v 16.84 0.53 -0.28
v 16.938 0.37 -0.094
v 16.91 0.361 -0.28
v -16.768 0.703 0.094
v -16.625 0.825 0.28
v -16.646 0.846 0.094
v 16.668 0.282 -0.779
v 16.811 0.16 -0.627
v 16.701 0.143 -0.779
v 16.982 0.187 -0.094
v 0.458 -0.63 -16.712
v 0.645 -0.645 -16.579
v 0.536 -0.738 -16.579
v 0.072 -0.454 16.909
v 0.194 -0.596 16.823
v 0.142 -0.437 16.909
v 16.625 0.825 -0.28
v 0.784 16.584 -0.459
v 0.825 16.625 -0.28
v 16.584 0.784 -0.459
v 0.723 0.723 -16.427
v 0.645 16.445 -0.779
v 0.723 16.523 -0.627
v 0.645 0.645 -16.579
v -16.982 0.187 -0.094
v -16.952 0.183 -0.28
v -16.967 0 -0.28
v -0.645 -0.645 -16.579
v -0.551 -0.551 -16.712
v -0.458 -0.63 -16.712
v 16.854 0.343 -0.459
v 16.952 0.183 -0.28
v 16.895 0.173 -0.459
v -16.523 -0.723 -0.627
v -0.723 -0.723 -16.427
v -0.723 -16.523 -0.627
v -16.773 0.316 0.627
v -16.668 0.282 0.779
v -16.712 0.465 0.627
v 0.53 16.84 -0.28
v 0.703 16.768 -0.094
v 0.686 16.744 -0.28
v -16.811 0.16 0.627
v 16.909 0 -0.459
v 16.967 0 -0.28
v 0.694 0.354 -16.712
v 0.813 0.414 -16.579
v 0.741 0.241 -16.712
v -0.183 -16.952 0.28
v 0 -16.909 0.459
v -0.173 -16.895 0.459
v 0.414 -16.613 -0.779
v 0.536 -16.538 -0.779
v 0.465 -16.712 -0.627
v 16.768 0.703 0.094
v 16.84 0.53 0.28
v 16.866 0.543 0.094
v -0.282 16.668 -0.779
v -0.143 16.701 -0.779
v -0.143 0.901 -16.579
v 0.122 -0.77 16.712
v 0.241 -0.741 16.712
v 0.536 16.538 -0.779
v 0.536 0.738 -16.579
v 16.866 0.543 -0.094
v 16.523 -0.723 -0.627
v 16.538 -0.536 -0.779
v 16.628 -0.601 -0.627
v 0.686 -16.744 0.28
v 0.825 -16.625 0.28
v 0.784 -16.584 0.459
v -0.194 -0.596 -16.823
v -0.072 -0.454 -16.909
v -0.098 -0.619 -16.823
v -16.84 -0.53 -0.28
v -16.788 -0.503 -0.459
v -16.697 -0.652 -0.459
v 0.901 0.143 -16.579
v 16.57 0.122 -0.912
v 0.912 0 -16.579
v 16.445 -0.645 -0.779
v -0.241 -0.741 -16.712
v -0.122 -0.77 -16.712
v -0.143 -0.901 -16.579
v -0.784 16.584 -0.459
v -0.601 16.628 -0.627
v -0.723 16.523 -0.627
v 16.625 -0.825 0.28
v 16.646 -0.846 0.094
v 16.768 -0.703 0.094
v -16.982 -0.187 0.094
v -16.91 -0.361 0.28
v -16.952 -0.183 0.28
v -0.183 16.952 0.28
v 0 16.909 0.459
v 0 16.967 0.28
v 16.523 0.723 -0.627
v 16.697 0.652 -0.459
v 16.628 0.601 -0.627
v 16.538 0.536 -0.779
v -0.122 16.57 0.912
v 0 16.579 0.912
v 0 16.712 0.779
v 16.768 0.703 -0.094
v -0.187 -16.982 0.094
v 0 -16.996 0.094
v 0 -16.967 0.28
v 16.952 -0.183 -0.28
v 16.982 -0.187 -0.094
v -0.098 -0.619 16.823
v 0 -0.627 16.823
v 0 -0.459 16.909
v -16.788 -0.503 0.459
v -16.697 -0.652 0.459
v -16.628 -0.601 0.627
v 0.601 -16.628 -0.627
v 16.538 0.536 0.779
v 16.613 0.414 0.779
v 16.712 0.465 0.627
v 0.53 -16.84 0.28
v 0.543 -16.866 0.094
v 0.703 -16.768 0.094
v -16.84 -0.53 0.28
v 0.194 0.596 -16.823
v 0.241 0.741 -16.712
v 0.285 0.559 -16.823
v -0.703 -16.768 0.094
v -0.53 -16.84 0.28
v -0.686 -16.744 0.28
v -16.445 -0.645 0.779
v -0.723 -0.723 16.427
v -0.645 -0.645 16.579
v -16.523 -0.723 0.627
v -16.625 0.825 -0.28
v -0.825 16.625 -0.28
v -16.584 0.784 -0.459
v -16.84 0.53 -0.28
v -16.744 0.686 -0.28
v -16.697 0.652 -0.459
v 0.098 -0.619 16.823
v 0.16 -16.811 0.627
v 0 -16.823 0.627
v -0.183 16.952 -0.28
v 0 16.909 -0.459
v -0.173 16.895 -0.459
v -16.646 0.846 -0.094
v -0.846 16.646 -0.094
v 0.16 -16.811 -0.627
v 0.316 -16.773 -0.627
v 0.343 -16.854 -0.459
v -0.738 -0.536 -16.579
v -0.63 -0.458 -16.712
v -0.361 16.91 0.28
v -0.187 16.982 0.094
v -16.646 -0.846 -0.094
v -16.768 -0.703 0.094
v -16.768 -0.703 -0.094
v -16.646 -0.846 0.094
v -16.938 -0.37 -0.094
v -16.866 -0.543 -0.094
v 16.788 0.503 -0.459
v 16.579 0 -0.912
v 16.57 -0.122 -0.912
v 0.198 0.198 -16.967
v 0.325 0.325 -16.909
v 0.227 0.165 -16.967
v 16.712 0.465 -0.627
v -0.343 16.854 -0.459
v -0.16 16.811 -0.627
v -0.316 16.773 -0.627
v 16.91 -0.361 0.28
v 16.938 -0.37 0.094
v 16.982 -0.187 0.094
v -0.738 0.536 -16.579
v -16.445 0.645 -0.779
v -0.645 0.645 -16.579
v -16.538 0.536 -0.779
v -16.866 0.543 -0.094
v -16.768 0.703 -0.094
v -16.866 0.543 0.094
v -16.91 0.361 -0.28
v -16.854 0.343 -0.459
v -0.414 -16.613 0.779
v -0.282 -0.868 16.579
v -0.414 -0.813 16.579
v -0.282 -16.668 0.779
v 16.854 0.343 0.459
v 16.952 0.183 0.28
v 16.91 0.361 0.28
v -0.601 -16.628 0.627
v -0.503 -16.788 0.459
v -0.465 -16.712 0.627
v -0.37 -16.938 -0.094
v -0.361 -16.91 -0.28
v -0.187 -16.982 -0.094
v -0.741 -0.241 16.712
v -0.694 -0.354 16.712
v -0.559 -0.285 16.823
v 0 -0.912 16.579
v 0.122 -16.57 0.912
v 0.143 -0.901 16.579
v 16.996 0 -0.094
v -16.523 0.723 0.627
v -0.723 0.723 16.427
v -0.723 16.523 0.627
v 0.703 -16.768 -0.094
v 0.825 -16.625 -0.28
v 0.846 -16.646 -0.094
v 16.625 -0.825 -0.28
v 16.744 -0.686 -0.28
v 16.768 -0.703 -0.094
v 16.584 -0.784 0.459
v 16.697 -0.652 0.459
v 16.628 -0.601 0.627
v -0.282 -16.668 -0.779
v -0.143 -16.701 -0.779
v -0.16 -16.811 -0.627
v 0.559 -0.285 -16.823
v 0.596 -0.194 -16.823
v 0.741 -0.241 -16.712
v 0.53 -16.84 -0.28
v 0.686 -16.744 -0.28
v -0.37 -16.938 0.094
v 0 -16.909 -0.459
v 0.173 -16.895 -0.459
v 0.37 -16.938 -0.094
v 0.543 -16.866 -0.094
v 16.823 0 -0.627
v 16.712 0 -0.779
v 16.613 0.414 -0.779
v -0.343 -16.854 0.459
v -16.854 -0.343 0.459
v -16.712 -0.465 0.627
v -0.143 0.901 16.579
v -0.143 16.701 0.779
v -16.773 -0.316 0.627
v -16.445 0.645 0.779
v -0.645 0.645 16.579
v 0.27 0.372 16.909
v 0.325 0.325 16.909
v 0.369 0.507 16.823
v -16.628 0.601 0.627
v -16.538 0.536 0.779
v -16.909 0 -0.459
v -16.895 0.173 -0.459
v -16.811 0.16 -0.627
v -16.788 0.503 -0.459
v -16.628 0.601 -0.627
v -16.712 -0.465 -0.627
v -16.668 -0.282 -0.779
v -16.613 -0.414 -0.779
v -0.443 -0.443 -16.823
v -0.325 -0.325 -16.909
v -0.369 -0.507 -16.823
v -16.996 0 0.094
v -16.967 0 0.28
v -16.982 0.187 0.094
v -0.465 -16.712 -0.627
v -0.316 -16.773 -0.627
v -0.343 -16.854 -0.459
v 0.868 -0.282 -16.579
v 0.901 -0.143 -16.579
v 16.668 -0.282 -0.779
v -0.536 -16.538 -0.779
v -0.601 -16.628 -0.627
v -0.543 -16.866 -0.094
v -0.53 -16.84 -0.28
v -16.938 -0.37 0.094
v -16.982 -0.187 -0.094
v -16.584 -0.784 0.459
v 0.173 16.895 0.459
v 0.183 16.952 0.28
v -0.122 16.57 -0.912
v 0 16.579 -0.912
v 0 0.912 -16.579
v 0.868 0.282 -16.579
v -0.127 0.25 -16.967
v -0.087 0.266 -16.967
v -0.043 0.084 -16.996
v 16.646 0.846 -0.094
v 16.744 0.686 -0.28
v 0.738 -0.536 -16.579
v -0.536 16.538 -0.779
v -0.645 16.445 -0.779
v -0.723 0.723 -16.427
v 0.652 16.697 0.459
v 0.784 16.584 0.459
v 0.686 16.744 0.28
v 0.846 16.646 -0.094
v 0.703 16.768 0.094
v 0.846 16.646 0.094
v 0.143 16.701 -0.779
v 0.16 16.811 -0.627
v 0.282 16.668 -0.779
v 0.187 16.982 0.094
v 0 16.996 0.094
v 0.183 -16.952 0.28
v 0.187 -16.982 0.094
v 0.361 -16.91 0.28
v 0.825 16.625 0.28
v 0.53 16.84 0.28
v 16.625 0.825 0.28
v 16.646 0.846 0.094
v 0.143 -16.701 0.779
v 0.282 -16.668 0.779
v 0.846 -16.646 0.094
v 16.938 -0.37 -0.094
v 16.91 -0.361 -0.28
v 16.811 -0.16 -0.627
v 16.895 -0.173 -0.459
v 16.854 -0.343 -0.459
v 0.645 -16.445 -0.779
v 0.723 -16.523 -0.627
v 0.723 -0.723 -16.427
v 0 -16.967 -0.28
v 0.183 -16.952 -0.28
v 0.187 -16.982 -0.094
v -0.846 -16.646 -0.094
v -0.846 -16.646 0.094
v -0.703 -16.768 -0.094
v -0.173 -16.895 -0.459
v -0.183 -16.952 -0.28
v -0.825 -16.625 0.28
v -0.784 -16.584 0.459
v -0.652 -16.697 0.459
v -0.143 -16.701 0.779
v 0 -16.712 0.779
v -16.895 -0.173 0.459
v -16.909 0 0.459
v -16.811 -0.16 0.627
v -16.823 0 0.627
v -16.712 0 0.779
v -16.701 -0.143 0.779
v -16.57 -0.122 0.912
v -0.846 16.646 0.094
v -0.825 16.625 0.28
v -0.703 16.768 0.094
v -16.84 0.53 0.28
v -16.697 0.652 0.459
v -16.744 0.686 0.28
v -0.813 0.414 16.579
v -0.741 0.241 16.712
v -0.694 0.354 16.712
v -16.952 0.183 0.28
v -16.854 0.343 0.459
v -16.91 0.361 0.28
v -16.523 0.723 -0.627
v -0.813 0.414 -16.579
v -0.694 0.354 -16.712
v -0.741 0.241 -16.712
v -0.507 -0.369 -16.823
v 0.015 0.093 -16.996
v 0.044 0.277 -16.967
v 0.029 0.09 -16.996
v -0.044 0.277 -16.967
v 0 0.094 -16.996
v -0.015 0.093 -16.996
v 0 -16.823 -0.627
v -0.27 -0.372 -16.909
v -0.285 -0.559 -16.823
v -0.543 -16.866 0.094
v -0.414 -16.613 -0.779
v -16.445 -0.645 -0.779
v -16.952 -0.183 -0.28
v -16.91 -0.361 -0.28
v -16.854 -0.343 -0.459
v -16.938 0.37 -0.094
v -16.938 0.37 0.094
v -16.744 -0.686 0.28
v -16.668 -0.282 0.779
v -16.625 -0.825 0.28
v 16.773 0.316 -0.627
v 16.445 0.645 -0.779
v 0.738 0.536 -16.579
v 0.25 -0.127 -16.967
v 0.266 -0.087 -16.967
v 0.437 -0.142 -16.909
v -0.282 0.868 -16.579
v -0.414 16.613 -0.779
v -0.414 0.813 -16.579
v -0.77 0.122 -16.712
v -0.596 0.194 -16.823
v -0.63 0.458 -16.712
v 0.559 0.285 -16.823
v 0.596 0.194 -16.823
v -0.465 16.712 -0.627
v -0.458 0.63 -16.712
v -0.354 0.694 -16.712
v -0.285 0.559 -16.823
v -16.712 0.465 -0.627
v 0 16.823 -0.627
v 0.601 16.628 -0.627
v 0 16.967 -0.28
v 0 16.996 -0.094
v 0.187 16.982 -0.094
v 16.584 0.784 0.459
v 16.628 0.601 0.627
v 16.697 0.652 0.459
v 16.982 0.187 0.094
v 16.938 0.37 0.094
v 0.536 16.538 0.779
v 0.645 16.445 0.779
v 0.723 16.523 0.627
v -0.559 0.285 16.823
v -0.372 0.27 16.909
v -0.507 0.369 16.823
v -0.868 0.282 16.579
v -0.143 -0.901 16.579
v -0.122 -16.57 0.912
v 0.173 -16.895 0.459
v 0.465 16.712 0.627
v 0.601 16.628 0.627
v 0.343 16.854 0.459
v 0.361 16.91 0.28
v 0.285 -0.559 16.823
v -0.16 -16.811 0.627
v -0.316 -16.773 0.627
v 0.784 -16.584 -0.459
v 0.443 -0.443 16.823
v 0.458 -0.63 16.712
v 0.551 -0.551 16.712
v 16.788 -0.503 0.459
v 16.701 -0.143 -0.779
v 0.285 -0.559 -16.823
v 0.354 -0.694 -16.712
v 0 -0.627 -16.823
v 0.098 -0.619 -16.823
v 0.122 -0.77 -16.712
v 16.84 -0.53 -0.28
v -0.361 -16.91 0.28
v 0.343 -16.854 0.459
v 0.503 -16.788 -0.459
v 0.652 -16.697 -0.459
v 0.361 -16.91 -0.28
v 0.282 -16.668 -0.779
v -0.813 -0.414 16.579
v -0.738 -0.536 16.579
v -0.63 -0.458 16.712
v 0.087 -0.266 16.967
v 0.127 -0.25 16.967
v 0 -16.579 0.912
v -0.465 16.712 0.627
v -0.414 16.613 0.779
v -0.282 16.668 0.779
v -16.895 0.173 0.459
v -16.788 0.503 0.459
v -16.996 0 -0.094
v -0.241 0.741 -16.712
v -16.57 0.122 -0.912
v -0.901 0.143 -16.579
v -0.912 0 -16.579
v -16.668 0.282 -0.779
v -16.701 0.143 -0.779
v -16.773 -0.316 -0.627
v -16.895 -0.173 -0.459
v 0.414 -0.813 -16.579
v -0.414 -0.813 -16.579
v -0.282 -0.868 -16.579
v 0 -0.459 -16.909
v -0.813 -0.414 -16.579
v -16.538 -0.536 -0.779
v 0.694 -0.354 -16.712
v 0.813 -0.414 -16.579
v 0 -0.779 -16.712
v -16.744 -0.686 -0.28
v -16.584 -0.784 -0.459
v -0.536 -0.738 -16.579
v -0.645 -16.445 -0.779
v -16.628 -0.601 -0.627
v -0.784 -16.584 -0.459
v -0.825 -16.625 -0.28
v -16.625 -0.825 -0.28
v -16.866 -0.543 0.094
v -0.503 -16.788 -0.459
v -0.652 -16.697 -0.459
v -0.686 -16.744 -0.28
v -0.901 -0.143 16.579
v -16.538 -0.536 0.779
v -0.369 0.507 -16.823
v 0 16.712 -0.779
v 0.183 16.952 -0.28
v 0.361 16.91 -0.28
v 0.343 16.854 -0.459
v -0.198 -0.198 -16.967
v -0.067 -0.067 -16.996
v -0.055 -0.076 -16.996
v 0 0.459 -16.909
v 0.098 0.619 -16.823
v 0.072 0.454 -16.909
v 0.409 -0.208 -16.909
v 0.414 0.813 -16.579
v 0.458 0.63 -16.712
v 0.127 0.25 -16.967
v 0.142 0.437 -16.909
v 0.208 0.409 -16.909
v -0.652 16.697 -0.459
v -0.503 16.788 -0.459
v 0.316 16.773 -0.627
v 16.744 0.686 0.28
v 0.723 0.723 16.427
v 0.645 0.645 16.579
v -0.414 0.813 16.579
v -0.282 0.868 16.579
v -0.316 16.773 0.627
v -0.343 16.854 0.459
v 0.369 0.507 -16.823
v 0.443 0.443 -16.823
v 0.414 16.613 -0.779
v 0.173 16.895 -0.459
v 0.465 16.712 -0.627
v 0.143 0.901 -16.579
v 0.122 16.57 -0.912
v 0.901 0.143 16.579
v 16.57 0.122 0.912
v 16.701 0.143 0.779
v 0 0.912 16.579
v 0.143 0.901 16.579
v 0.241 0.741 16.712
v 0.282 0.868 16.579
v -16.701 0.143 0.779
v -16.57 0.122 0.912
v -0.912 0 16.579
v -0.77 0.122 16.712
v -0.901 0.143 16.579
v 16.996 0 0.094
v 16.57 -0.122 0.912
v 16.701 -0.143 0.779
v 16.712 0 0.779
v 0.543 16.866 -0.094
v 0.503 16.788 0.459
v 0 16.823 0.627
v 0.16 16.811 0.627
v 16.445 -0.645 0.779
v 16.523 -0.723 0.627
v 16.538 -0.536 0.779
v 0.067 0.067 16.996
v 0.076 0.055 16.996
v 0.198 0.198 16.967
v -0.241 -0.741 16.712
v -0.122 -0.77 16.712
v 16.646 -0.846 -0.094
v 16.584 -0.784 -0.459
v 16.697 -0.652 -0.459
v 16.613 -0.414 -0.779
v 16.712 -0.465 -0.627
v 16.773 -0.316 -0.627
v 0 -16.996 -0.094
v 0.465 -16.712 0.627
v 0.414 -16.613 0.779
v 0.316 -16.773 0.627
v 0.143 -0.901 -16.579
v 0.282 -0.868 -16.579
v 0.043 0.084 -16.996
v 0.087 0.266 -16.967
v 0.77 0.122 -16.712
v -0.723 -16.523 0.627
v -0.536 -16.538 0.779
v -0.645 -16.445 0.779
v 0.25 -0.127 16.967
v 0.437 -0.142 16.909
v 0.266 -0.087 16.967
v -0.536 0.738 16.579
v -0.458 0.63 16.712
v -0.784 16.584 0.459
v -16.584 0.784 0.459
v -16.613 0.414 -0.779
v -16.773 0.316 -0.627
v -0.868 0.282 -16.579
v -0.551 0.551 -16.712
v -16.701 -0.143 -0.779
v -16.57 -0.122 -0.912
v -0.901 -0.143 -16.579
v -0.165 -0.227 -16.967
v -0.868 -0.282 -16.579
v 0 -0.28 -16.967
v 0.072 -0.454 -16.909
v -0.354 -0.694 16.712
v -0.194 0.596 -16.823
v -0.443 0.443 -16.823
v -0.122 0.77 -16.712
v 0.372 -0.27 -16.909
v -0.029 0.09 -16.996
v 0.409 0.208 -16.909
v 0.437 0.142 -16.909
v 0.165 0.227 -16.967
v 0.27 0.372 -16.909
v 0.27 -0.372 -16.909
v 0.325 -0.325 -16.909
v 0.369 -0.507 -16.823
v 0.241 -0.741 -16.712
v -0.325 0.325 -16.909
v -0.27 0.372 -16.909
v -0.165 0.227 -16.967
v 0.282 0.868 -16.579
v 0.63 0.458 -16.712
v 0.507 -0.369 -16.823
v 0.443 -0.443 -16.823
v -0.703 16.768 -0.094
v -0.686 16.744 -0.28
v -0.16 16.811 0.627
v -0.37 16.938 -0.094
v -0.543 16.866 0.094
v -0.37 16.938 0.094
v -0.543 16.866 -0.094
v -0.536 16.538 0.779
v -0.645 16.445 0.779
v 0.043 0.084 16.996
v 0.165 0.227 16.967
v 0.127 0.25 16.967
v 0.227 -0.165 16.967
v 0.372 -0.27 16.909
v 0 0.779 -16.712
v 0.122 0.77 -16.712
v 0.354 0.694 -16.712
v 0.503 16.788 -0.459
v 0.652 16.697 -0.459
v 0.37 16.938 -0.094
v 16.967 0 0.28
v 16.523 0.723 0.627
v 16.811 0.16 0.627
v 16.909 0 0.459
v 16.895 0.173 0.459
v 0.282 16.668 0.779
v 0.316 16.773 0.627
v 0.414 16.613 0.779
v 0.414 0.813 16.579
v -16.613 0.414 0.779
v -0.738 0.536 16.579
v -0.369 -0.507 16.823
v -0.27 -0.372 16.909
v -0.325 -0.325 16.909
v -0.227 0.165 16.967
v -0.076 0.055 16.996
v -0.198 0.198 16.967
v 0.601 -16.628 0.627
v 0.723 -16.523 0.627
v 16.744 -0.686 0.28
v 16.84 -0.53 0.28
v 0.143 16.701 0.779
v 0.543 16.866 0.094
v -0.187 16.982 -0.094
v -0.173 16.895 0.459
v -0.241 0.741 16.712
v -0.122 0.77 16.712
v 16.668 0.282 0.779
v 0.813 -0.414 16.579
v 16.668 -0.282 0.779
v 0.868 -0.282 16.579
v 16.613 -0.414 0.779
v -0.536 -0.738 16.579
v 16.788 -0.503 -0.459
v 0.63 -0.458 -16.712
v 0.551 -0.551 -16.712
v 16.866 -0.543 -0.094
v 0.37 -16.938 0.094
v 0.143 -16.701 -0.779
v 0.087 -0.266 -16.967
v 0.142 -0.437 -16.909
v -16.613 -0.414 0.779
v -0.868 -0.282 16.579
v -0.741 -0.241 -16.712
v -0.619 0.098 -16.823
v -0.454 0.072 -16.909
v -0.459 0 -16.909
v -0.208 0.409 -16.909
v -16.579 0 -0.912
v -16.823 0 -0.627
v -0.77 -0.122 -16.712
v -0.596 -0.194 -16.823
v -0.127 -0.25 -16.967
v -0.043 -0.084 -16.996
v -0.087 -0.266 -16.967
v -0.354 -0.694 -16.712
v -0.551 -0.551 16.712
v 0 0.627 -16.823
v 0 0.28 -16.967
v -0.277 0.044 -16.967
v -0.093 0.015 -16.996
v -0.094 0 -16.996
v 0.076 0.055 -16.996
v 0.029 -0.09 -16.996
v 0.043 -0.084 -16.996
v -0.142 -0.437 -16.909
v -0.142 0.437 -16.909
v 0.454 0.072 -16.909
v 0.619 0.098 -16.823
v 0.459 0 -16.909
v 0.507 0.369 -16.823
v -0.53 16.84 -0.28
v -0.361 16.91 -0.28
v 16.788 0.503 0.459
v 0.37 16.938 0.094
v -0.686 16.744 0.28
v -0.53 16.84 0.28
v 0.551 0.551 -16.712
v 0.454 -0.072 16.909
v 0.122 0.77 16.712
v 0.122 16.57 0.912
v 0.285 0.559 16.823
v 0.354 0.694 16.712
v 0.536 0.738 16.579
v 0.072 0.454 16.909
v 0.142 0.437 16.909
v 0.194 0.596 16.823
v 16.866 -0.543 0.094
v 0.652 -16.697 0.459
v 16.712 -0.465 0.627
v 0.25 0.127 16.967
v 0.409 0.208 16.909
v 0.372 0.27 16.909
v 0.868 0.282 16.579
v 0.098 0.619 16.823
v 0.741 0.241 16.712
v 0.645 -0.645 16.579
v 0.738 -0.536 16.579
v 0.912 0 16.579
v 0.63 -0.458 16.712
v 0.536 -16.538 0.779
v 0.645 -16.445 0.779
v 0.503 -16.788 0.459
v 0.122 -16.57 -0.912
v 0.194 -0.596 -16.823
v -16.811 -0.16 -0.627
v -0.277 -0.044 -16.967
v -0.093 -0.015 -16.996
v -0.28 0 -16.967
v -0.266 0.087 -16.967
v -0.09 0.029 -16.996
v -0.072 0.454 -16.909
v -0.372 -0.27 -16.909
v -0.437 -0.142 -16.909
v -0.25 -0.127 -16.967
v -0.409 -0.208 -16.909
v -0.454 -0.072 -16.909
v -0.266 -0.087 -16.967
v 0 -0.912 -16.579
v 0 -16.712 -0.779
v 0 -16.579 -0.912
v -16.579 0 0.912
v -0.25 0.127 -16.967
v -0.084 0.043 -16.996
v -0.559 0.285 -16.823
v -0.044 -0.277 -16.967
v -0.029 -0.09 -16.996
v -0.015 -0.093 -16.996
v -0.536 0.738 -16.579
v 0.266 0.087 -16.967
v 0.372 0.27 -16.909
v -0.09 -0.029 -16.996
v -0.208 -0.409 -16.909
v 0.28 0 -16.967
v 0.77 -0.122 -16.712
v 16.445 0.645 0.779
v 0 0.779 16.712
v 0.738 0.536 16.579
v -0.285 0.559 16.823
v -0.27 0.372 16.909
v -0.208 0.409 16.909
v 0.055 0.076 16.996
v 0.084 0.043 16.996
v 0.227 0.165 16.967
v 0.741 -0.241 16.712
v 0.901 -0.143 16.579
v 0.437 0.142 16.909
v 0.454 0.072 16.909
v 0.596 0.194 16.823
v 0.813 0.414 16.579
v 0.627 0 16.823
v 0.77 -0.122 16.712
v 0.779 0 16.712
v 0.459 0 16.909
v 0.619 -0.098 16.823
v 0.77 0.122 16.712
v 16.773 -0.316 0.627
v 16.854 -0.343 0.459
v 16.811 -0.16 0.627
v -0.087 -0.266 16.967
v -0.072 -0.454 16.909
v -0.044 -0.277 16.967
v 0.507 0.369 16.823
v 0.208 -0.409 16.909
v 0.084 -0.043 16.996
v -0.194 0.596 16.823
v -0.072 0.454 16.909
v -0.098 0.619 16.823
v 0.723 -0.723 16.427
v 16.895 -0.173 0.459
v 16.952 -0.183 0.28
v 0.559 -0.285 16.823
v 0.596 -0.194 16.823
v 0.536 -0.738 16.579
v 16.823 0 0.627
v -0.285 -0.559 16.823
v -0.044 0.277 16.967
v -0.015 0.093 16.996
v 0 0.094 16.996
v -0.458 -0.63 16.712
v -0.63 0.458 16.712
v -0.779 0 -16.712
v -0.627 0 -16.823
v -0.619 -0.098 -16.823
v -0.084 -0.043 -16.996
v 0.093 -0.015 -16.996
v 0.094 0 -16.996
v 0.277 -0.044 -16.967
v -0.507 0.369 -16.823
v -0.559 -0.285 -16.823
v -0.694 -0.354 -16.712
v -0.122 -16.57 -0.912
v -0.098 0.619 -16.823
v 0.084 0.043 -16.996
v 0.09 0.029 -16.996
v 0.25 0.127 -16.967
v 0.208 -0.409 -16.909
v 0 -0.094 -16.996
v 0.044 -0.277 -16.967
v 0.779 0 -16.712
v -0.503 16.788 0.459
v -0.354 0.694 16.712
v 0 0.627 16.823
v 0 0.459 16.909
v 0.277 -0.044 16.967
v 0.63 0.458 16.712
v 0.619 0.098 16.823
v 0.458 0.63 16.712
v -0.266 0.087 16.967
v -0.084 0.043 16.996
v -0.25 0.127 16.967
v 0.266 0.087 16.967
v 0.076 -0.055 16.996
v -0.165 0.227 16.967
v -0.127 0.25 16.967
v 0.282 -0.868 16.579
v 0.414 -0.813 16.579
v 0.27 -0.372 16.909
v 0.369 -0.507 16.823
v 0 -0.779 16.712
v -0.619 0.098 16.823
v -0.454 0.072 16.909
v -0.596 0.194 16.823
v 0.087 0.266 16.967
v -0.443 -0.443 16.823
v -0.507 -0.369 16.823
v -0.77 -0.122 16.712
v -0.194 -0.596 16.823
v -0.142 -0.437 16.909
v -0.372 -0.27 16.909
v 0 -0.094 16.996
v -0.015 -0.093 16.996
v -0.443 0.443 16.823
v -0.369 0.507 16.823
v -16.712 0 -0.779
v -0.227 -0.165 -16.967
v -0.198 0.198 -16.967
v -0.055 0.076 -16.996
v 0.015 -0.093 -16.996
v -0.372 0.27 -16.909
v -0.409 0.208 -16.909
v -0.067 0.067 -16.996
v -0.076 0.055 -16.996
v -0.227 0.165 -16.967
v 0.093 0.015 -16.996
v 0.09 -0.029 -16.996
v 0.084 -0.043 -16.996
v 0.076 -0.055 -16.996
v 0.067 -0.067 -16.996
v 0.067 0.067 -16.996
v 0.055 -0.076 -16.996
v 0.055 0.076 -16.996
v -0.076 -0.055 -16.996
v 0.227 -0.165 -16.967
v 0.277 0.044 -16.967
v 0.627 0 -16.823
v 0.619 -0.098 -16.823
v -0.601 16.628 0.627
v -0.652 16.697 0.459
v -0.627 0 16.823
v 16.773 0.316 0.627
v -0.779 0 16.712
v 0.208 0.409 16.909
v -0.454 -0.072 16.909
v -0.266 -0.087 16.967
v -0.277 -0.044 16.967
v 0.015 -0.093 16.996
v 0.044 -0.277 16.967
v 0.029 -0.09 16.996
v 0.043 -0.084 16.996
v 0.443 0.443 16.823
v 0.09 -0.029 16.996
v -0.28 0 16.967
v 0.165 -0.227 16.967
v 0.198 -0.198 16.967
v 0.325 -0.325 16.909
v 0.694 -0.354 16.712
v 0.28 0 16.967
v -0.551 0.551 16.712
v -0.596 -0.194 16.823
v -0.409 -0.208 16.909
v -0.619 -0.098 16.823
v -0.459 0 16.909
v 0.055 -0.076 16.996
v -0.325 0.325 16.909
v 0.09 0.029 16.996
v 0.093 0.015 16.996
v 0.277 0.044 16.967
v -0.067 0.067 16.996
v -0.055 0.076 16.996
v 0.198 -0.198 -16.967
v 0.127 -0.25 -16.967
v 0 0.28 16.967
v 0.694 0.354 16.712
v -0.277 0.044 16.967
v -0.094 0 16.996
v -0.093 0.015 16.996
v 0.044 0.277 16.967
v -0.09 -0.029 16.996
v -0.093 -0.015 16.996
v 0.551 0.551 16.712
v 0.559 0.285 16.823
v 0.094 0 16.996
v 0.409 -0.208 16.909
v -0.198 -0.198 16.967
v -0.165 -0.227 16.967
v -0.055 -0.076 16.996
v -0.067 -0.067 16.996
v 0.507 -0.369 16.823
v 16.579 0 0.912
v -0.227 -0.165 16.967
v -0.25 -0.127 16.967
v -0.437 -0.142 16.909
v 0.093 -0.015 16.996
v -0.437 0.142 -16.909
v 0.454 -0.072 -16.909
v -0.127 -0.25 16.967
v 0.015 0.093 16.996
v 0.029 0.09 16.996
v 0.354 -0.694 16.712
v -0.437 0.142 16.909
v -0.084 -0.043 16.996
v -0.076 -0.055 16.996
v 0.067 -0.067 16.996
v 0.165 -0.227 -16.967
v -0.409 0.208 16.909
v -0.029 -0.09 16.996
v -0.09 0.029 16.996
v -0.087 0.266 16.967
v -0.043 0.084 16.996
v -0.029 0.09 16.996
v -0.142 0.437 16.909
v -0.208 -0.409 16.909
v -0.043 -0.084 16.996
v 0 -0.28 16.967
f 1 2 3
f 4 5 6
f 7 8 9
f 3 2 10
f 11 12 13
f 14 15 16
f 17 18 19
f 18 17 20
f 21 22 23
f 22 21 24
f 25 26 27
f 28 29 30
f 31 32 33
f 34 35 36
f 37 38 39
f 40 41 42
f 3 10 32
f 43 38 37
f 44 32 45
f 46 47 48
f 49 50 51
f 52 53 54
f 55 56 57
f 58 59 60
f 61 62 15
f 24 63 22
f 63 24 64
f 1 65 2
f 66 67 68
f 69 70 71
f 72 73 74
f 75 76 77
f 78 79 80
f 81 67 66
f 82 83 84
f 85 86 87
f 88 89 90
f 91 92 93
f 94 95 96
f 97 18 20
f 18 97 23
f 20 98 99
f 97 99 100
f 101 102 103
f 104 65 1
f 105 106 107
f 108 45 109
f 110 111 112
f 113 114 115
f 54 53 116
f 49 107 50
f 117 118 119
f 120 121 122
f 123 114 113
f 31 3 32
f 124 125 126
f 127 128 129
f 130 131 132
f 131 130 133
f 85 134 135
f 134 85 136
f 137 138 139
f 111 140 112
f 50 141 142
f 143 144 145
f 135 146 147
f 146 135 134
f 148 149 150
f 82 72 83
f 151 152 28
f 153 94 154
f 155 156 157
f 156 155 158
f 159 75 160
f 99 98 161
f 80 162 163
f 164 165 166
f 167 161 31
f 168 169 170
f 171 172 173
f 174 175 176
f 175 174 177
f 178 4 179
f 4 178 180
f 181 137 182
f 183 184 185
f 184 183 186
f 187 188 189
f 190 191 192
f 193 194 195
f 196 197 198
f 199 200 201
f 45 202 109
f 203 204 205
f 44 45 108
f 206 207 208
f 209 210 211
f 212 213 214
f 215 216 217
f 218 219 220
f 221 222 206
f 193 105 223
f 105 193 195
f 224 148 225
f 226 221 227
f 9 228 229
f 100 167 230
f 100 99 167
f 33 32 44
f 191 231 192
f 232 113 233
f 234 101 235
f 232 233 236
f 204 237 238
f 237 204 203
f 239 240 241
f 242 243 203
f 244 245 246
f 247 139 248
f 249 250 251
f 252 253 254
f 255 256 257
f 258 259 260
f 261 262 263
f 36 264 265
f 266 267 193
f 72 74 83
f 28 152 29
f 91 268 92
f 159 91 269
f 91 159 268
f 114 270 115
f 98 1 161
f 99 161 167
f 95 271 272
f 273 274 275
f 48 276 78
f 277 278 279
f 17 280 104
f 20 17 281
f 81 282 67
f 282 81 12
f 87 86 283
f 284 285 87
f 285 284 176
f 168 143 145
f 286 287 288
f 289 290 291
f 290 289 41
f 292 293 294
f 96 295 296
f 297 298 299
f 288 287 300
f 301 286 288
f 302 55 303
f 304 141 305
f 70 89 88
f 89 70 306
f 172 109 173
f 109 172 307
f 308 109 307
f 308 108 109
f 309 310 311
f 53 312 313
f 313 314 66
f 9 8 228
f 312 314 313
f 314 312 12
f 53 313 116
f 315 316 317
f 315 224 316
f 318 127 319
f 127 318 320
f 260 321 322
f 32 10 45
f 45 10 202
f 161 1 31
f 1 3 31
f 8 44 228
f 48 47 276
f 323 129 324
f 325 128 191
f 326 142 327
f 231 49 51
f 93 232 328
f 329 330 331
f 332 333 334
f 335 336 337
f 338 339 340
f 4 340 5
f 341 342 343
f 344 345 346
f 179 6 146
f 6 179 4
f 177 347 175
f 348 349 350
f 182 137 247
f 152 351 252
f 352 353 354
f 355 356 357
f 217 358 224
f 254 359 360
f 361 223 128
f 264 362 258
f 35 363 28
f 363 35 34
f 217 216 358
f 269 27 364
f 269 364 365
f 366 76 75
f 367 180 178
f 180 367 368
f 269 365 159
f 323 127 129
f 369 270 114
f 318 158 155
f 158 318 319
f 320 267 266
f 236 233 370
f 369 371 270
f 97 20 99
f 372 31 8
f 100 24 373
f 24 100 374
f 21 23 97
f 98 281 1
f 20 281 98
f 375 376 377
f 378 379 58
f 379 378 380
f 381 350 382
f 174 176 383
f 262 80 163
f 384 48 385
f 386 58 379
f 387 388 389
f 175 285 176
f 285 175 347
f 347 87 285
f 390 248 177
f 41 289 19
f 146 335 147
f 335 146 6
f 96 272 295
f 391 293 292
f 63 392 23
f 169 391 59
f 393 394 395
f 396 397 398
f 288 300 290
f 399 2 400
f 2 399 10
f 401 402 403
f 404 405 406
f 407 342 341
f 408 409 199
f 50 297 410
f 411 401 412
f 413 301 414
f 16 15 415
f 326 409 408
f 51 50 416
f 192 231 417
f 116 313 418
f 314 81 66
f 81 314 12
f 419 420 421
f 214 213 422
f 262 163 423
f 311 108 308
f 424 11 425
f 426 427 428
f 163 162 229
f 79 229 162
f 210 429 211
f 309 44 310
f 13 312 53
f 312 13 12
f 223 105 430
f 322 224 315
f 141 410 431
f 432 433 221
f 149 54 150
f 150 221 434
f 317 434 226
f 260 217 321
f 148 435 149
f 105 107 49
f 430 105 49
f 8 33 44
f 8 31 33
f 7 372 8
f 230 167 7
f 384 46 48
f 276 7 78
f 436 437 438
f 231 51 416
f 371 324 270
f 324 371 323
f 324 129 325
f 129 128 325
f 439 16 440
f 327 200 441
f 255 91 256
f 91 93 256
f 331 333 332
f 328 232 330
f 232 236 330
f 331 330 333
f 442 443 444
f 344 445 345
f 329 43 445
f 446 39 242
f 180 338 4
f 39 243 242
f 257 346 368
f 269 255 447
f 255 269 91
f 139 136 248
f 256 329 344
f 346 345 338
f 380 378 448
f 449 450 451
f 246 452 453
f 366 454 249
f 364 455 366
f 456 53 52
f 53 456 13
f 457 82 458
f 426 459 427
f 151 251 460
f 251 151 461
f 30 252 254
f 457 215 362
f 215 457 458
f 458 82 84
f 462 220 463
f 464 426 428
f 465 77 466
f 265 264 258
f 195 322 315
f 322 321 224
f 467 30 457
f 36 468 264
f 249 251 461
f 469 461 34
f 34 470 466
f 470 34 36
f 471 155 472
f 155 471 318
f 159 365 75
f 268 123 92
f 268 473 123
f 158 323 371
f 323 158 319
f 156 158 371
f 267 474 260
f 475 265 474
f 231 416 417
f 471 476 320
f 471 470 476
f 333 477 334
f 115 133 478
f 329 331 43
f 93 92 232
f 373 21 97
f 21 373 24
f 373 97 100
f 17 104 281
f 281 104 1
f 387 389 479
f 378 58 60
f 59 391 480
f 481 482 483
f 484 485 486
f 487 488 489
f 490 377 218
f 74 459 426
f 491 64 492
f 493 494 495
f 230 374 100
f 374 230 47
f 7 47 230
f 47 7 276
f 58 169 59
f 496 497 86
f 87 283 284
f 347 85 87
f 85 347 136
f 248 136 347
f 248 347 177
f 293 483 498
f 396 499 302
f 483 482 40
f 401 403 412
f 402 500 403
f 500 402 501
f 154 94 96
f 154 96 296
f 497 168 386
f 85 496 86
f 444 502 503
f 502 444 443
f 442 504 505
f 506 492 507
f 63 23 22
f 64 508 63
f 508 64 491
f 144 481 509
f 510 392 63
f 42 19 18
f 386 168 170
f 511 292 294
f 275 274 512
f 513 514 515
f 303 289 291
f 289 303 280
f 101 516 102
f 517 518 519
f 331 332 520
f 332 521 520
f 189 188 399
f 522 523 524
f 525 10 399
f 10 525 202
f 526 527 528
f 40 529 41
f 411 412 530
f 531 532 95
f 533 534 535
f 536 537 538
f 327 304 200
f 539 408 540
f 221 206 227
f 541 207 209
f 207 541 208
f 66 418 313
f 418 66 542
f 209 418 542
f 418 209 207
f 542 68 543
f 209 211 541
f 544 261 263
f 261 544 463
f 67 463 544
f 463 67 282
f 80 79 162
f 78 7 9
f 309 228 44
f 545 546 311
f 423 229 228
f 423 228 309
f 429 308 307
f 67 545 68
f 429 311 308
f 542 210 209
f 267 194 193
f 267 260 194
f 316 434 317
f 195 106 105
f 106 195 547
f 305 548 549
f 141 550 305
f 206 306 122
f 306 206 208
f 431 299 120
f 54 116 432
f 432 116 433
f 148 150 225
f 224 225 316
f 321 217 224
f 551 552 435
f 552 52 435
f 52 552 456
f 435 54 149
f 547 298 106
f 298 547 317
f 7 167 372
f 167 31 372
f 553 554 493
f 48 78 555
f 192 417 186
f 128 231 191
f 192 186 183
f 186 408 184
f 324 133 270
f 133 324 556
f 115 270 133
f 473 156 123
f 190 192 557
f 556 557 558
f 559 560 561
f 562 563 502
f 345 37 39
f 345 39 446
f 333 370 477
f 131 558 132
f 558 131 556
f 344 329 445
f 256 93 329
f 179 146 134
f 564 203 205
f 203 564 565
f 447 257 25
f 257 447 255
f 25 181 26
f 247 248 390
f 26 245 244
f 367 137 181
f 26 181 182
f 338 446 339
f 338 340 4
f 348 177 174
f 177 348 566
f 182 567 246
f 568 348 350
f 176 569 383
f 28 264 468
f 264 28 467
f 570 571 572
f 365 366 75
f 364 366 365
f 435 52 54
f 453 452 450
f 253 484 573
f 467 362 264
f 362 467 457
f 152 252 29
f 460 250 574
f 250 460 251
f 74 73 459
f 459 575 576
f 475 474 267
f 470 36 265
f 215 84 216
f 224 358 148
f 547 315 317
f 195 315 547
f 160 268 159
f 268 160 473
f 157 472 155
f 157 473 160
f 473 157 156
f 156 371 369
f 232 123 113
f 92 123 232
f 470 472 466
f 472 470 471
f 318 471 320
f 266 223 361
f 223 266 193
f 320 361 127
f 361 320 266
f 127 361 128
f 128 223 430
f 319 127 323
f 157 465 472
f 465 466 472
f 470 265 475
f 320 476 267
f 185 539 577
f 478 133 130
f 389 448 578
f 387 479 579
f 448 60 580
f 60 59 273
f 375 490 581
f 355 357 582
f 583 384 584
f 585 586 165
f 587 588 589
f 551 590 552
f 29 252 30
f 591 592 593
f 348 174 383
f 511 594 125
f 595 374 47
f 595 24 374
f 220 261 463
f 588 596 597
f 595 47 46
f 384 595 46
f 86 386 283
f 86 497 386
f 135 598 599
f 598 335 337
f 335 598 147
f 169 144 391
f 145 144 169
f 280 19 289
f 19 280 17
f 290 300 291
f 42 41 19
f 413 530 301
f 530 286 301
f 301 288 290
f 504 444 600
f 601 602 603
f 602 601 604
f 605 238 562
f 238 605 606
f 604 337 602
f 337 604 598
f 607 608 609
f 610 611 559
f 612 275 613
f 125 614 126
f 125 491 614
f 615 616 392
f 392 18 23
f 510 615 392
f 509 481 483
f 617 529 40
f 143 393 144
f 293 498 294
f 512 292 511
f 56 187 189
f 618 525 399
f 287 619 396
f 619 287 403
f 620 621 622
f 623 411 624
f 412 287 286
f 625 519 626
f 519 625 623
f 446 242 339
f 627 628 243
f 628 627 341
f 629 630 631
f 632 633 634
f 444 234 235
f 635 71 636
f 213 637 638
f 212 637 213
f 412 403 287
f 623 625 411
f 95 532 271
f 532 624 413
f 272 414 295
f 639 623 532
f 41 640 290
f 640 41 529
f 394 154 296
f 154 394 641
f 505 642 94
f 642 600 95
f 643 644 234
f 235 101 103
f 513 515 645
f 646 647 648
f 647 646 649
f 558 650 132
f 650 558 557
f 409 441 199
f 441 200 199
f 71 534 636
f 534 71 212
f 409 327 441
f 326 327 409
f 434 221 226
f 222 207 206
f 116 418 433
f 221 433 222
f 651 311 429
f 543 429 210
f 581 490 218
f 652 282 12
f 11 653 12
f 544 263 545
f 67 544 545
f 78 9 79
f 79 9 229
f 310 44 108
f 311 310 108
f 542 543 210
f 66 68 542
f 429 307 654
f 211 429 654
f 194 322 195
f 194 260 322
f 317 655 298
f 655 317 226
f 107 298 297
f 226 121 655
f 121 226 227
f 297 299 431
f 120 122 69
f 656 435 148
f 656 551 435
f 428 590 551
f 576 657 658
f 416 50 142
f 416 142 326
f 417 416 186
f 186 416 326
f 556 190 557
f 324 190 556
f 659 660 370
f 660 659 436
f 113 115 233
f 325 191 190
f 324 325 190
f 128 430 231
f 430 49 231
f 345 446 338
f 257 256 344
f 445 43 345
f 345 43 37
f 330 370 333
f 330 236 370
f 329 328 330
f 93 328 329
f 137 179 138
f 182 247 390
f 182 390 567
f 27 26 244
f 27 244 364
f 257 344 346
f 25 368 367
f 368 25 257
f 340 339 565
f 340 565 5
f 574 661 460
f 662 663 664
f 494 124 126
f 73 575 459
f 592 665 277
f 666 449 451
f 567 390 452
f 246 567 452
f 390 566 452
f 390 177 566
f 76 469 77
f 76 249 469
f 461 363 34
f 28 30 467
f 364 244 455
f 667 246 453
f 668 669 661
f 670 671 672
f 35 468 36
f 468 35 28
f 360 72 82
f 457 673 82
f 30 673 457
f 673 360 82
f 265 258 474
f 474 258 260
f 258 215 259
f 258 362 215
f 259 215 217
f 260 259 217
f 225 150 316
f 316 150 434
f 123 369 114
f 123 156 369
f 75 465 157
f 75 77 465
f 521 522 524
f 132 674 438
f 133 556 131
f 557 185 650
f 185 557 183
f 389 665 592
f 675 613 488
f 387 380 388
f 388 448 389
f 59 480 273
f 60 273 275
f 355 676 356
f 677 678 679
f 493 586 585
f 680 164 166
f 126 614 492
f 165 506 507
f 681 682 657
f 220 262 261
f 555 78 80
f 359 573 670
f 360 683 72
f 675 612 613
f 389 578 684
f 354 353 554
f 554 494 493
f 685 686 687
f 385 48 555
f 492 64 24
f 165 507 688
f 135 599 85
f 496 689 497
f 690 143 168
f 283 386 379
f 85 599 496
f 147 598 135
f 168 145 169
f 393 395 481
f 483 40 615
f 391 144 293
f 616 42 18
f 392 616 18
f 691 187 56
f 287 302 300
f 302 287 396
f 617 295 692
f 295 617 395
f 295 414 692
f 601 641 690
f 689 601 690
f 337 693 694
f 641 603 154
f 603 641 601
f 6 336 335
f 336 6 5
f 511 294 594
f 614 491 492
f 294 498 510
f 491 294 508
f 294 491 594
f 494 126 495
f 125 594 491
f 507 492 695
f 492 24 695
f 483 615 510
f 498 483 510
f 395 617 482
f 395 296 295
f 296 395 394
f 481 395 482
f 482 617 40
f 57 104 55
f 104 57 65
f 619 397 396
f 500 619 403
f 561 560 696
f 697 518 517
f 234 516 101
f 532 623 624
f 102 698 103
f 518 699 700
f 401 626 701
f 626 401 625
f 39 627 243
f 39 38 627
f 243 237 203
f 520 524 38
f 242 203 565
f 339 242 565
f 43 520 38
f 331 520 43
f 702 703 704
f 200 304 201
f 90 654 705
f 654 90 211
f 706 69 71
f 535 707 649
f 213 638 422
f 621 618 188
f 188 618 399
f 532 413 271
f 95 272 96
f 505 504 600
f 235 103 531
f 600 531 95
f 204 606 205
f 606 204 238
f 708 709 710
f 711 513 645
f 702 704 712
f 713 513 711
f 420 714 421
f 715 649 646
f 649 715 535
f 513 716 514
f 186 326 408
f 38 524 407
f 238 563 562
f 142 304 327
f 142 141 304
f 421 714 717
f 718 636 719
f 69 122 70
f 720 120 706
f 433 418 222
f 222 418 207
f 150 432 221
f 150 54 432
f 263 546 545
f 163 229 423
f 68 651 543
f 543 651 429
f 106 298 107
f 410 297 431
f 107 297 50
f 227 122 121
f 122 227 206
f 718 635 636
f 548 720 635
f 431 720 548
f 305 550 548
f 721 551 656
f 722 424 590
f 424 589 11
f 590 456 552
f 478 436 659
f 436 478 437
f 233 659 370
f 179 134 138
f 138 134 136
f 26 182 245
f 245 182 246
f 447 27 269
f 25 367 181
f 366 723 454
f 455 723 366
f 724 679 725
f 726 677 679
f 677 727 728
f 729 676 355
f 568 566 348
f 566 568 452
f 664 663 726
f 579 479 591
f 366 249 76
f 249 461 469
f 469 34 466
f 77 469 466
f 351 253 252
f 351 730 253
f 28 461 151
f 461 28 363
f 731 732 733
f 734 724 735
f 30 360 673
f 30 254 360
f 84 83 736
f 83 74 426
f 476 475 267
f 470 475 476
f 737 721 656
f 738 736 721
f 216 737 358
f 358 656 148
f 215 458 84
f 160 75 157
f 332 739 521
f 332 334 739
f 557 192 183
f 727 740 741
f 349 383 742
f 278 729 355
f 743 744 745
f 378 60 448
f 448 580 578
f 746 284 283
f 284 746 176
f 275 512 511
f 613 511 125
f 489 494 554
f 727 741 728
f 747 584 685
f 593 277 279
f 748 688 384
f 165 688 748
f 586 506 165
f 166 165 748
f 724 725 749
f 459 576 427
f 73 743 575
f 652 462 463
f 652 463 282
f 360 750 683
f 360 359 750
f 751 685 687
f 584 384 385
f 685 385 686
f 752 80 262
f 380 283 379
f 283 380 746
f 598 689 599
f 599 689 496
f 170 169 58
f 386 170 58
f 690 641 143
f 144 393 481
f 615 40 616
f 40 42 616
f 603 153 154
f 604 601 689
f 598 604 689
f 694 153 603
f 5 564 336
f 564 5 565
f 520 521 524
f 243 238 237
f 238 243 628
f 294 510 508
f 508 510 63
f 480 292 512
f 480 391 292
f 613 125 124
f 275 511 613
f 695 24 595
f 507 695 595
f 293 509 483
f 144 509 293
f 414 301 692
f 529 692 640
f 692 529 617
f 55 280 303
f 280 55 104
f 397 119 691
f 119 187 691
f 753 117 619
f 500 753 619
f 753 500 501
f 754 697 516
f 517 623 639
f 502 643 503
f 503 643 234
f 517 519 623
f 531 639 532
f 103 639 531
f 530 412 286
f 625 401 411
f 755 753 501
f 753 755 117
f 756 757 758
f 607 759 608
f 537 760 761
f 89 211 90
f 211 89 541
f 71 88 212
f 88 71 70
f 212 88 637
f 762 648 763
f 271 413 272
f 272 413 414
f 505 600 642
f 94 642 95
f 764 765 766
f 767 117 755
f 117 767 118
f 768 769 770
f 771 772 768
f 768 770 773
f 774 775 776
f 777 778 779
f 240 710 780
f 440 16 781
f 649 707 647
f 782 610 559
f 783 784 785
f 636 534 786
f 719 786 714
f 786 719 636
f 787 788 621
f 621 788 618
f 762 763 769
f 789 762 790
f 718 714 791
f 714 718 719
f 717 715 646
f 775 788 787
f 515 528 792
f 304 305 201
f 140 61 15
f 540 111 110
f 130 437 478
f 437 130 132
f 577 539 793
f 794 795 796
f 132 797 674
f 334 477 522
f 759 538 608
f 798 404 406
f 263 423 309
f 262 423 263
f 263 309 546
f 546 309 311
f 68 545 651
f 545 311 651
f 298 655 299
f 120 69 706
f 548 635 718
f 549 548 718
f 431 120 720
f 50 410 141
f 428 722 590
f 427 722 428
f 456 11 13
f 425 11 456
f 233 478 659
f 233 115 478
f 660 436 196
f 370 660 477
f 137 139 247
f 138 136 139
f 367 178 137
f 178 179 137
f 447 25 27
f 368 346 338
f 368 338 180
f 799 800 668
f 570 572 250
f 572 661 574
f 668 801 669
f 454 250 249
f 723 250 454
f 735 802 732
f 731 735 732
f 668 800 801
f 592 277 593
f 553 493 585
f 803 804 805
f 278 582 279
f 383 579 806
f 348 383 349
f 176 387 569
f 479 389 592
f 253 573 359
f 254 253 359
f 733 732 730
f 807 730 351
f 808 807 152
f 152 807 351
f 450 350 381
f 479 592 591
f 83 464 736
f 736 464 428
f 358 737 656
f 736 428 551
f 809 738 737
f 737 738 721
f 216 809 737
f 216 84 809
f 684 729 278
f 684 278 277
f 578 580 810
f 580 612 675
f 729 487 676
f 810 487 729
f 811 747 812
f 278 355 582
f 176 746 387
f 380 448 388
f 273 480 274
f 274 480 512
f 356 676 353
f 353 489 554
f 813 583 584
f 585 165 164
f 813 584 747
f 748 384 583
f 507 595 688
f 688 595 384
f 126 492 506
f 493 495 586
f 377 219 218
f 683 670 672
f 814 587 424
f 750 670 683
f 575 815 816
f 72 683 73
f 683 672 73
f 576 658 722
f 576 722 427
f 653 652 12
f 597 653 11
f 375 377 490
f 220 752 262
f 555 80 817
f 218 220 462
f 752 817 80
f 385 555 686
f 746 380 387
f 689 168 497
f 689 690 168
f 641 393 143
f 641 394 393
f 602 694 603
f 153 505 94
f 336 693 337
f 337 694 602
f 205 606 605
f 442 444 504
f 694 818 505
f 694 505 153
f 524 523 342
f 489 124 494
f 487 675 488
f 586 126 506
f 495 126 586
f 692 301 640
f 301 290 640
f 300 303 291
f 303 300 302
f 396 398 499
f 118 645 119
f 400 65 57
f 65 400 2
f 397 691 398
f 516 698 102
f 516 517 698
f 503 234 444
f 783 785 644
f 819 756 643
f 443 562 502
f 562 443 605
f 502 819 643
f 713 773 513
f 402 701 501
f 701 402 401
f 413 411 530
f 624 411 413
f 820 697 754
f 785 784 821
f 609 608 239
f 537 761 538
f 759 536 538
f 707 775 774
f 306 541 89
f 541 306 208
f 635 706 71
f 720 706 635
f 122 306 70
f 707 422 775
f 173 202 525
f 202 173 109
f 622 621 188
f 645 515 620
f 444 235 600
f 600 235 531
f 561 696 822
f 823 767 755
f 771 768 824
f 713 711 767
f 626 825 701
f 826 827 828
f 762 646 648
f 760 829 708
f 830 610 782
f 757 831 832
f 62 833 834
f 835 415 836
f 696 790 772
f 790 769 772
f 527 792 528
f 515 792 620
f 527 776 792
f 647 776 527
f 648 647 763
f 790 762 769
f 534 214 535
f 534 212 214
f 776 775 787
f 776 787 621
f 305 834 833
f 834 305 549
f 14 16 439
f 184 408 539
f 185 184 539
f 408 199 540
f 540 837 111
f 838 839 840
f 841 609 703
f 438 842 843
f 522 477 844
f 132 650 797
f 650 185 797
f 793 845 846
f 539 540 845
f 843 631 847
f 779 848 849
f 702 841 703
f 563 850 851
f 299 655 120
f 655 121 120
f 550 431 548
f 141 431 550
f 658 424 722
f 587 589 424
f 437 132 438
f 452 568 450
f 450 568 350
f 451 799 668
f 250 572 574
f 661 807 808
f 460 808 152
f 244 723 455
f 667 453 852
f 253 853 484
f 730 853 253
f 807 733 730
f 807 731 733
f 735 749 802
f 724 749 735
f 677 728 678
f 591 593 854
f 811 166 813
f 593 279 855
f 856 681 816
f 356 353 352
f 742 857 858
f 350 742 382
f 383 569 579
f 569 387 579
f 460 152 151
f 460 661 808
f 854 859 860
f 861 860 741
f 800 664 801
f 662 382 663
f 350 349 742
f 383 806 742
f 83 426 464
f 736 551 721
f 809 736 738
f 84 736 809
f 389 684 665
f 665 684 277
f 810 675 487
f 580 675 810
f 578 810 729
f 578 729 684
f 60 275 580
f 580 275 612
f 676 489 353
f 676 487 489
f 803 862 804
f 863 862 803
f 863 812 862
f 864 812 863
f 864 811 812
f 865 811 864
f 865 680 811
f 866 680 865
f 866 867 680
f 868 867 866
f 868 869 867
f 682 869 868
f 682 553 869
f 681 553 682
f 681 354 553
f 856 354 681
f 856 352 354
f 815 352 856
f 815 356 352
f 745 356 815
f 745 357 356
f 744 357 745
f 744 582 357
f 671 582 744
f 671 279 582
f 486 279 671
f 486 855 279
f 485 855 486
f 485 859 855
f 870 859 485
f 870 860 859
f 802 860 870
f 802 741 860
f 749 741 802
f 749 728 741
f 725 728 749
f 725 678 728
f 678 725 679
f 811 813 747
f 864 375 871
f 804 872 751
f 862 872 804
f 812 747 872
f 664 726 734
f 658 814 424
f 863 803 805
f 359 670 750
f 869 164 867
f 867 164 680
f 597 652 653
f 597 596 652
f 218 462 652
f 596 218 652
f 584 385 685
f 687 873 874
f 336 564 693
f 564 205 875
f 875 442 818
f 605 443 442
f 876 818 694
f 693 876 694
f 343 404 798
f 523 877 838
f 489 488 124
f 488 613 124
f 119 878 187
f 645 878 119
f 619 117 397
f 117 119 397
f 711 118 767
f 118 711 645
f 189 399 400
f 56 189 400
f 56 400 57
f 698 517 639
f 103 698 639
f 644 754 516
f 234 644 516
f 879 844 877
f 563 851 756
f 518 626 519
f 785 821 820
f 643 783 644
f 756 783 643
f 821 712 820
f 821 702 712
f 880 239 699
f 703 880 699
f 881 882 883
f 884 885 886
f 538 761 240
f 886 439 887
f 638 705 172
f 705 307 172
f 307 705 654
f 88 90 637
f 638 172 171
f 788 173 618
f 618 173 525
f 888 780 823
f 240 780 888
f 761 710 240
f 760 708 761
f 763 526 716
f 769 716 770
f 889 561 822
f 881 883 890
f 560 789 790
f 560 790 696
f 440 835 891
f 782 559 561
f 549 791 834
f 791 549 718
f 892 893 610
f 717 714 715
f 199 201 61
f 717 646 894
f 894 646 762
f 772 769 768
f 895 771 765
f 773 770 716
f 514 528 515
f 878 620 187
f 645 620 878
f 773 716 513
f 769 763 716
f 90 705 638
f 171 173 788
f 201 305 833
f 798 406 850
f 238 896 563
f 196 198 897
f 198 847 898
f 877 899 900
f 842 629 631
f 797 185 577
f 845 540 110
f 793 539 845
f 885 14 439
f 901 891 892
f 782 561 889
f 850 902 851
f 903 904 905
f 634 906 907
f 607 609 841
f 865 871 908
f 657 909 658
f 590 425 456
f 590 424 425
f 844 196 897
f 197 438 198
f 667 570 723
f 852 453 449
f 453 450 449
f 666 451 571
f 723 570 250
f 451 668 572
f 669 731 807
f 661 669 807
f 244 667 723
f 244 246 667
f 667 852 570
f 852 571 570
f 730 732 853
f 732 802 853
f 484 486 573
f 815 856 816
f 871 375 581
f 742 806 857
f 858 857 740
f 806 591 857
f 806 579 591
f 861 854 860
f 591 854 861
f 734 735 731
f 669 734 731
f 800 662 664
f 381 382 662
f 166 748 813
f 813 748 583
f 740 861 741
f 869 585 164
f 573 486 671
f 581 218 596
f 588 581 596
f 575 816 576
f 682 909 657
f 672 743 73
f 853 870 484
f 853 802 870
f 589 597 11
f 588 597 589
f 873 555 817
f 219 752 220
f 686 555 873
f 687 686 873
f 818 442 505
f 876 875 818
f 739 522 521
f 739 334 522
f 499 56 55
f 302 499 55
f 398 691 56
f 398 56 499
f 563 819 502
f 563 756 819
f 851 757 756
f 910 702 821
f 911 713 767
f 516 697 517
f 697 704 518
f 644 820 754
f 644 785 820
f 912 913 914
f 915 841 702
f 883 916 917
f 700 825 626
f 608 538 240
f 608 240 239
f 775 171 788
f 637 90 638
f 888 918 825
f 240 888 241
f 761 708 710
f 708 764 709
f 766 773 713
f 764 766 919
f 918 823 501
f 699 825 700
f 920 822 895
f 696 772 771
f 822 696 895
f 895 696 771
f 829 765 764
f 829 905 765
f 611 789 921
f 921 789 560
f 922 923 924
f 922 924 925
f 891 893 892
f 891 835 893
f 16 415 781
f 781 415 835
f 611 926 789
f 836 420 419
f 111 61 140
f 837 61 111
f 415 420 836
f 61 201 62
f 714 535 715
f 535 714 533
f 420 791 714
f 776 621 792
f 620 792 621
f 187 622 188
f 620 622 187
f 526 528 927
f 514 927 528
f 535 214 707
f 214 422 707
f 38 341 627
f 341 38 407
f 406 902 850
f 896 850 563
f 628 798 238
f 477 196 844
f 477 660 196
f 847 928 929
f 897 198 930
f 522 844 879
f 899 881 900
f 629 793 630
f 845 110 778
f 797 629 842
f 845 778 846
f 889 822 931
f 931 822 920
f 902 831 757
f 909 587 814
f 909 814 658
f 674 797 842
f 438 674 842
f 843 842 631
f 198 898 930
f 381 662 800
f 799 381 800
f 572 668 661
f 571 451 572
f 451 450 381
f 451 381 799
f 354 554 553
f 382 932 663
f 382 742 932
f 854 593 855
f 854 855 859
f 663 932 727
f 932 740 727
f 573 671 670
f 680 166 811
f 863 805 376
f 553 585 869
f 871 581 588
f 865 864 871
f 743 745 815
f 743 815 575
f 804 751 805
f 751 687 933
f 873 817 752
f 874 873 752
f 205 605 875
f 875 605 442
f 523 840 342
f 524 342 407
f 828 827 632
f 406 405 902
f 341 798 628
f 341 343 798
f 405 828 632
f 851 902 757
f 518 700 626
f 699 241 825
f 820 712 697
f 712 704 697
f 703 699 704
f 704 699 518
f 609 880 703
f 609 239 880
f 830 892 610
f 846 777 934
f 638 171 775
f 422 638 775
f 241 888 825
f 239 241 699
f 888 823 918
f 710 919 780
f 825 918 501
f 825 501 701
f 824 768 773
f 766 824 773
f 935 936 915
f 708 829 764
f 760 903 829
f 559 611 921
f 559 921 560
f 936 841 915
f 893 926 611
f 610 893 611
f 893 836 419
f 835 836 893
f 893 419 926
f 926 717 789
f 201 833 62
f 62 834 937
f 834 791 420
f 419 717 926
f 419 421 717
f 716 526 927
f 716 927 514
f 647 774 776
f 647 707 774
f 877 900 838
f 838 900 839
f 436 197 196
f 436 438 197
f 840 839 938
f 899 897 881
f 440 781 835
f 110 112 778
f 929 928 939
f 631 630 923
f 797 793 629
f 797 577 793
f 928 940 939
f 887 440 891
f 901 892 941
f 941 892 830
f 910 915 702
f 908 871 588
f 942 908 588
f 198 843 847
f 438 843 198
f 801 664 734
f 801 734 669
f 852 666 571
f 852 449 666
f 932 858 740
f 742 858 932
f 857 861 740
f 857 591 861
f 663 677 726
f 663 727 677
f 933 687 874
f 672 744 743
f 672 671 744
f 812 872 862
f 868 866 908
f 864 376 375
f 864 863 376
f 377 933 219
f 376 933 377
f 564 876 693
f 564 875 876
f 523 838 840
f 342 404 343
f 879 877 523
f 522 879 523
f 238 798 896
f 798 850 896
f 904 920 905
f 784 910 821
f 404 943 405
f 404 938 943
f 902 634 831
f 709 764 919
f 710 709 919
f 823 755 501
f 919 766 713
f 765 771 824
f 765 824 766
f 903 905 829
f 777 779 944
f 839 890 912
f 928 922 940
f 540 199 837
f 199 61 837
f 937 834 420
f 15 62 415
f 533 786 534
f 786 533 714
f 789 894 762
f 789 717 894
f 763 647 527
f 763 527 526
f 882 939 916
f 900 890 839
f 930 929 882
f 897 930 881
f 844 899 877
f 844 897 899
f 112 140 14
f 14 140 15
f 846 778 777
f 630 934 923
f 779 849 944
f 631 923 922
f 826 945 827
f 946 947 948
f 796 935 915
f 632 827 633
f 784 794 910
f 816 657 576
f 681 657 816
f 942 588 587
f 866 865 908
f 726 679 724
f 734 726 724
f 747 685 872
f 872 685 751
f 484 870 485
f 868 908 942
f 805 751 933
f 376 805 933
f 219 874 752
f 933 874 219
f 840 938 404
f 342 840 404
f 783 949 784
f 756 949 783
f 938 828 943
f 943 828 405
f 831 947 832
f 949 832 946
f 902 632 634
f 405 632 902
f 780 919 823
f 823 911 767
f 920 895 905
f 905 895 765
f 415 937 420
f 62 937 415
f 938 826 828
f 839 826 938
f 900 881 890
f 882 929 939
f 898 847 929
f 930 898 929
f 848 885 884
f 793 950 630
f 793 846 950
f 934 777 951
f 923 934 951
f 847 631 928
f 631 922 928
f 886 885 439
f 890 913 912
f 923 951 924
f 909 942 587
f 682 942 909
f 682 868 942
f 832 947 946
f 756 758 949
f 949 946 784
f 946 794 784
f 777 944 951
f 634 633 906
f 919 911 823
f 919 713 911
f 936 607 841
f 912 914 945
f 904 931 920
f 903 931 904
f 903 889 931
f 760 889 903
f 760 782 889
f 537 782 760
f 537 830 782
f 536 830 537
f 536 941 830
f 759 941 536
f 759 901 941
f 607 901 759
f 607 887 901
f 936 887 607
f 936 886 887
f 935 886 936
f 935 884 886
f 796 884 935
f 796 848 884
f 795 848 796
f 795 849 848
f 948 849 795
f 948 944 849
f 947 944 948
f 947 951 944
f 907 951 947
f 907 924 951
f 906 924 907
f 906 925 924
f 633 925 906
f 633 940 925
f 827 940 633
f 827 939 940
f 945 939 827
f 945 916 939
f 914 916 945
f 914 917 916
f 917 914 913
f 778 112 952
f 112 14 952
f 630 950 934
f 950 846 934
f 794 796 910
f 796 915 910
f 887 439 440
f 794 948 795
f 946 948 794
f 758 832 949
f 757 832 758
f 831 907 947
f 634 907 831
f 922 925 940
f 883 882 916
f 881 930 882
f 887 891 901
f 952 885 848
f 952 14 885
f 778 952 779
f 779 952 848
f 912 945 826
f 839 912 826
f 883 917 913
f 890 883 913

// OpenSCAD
// Polyhedral story die: one icon per face, any Platonic solid.
shape="d8"; size=34; rr=1.2; glyph=10; depth=0.6; $fn=40;
icons=["","","","","","","",""];
phi=(1+sqrt(5))/2;
function pts(s) =
  s=="d4"  ? [[1,1,1],[1,-1,-1],[-1,1,-1],[-1,-1,1]] :
  s=="d6"  ? [for(x=[-1,1],y=[-1,1],z=[-1,1]) [x,y,z]] :
  s=="d8"  ? [[1,0,0],[-1,0,0],[0,1,0],[0,-1,0],[0,0,1],[0,0,-1]] :
  s=="d12" ? concat([for(x=[-1,1],y=[-1,1],z=[-1,1]) [x,y,z]],
               [for(y=[-1,1],z=[-1,1]) [0,y/phi,z*phi]],
               [for(x=[-1,1],y=[-1,1]) [x/phi,y*phi,0]],
               [for(x=[-1,1],z=[-1,1]) [x*phi,0,z/phi]]) :
  s=="d20" ? concat([for(y=[-1,1],z=[-1,1]) [0,y,z*phi]],
               [for(x=[-1,1],y=[-1,1]) [x,y*phi,0]],
               [for(x=[-1,1],z=[-1,1]) [x*phi,0,z]]) : [];
// face normals = the DUAL solid's vertex directions
function nrm(s) =
  s=="d4"  ? [for(p=pts("d4"))  -p/norm(p)] :
  s=="d6"  ? [for(p=pts("d8"))   p/norm(p)] :
  s=="d8"  ? [for(p=pts("d6"))   p/norm(p)] :
  s=="d12" ? [for(p=pts("d20"))  p/norm(p)] :
  s=="d20" ? [for(p=pts("d12"))  p/norm(p)] : [];
K   = (size/2 - rr) / max([for(q=pts(shape)) norm(q)]);
module body(){ hull() for(q=pts(shape)) translate(q*K) sphere(r=rr); }
module cut(i){
  n = nrm(shape)[i];
  d = max([for(q=pts(shape)) (q*K)*n]) + rr;      // supporting plane distance
  u0 = abs(n[2])>0.9 ? [0,1,0] : [0,0,1];
  u  = (u0 - n*(u0*n)) / norm(u0 - n*(u0*n));     // up, projected into face
  r  = cross(u,n);
  multmatrix([[r[0],u[0],n[0], n[0]*d],
              [r[1],u[1],n[1], n[1]*d],
              [r[2],u[2],n[2], n[2]*d],
              [0,0,0,1]])
    translate([0,0,-depth]) linear_extrude(height=depth+0.5)
      resize([glyph,glyph,0],auto=true) import(icons[i],center=true);
}
difference(){ body(); union(){ for(i=[0:len(nrm(shape))-1]) if(icons[i]!="") cut(i); } }
